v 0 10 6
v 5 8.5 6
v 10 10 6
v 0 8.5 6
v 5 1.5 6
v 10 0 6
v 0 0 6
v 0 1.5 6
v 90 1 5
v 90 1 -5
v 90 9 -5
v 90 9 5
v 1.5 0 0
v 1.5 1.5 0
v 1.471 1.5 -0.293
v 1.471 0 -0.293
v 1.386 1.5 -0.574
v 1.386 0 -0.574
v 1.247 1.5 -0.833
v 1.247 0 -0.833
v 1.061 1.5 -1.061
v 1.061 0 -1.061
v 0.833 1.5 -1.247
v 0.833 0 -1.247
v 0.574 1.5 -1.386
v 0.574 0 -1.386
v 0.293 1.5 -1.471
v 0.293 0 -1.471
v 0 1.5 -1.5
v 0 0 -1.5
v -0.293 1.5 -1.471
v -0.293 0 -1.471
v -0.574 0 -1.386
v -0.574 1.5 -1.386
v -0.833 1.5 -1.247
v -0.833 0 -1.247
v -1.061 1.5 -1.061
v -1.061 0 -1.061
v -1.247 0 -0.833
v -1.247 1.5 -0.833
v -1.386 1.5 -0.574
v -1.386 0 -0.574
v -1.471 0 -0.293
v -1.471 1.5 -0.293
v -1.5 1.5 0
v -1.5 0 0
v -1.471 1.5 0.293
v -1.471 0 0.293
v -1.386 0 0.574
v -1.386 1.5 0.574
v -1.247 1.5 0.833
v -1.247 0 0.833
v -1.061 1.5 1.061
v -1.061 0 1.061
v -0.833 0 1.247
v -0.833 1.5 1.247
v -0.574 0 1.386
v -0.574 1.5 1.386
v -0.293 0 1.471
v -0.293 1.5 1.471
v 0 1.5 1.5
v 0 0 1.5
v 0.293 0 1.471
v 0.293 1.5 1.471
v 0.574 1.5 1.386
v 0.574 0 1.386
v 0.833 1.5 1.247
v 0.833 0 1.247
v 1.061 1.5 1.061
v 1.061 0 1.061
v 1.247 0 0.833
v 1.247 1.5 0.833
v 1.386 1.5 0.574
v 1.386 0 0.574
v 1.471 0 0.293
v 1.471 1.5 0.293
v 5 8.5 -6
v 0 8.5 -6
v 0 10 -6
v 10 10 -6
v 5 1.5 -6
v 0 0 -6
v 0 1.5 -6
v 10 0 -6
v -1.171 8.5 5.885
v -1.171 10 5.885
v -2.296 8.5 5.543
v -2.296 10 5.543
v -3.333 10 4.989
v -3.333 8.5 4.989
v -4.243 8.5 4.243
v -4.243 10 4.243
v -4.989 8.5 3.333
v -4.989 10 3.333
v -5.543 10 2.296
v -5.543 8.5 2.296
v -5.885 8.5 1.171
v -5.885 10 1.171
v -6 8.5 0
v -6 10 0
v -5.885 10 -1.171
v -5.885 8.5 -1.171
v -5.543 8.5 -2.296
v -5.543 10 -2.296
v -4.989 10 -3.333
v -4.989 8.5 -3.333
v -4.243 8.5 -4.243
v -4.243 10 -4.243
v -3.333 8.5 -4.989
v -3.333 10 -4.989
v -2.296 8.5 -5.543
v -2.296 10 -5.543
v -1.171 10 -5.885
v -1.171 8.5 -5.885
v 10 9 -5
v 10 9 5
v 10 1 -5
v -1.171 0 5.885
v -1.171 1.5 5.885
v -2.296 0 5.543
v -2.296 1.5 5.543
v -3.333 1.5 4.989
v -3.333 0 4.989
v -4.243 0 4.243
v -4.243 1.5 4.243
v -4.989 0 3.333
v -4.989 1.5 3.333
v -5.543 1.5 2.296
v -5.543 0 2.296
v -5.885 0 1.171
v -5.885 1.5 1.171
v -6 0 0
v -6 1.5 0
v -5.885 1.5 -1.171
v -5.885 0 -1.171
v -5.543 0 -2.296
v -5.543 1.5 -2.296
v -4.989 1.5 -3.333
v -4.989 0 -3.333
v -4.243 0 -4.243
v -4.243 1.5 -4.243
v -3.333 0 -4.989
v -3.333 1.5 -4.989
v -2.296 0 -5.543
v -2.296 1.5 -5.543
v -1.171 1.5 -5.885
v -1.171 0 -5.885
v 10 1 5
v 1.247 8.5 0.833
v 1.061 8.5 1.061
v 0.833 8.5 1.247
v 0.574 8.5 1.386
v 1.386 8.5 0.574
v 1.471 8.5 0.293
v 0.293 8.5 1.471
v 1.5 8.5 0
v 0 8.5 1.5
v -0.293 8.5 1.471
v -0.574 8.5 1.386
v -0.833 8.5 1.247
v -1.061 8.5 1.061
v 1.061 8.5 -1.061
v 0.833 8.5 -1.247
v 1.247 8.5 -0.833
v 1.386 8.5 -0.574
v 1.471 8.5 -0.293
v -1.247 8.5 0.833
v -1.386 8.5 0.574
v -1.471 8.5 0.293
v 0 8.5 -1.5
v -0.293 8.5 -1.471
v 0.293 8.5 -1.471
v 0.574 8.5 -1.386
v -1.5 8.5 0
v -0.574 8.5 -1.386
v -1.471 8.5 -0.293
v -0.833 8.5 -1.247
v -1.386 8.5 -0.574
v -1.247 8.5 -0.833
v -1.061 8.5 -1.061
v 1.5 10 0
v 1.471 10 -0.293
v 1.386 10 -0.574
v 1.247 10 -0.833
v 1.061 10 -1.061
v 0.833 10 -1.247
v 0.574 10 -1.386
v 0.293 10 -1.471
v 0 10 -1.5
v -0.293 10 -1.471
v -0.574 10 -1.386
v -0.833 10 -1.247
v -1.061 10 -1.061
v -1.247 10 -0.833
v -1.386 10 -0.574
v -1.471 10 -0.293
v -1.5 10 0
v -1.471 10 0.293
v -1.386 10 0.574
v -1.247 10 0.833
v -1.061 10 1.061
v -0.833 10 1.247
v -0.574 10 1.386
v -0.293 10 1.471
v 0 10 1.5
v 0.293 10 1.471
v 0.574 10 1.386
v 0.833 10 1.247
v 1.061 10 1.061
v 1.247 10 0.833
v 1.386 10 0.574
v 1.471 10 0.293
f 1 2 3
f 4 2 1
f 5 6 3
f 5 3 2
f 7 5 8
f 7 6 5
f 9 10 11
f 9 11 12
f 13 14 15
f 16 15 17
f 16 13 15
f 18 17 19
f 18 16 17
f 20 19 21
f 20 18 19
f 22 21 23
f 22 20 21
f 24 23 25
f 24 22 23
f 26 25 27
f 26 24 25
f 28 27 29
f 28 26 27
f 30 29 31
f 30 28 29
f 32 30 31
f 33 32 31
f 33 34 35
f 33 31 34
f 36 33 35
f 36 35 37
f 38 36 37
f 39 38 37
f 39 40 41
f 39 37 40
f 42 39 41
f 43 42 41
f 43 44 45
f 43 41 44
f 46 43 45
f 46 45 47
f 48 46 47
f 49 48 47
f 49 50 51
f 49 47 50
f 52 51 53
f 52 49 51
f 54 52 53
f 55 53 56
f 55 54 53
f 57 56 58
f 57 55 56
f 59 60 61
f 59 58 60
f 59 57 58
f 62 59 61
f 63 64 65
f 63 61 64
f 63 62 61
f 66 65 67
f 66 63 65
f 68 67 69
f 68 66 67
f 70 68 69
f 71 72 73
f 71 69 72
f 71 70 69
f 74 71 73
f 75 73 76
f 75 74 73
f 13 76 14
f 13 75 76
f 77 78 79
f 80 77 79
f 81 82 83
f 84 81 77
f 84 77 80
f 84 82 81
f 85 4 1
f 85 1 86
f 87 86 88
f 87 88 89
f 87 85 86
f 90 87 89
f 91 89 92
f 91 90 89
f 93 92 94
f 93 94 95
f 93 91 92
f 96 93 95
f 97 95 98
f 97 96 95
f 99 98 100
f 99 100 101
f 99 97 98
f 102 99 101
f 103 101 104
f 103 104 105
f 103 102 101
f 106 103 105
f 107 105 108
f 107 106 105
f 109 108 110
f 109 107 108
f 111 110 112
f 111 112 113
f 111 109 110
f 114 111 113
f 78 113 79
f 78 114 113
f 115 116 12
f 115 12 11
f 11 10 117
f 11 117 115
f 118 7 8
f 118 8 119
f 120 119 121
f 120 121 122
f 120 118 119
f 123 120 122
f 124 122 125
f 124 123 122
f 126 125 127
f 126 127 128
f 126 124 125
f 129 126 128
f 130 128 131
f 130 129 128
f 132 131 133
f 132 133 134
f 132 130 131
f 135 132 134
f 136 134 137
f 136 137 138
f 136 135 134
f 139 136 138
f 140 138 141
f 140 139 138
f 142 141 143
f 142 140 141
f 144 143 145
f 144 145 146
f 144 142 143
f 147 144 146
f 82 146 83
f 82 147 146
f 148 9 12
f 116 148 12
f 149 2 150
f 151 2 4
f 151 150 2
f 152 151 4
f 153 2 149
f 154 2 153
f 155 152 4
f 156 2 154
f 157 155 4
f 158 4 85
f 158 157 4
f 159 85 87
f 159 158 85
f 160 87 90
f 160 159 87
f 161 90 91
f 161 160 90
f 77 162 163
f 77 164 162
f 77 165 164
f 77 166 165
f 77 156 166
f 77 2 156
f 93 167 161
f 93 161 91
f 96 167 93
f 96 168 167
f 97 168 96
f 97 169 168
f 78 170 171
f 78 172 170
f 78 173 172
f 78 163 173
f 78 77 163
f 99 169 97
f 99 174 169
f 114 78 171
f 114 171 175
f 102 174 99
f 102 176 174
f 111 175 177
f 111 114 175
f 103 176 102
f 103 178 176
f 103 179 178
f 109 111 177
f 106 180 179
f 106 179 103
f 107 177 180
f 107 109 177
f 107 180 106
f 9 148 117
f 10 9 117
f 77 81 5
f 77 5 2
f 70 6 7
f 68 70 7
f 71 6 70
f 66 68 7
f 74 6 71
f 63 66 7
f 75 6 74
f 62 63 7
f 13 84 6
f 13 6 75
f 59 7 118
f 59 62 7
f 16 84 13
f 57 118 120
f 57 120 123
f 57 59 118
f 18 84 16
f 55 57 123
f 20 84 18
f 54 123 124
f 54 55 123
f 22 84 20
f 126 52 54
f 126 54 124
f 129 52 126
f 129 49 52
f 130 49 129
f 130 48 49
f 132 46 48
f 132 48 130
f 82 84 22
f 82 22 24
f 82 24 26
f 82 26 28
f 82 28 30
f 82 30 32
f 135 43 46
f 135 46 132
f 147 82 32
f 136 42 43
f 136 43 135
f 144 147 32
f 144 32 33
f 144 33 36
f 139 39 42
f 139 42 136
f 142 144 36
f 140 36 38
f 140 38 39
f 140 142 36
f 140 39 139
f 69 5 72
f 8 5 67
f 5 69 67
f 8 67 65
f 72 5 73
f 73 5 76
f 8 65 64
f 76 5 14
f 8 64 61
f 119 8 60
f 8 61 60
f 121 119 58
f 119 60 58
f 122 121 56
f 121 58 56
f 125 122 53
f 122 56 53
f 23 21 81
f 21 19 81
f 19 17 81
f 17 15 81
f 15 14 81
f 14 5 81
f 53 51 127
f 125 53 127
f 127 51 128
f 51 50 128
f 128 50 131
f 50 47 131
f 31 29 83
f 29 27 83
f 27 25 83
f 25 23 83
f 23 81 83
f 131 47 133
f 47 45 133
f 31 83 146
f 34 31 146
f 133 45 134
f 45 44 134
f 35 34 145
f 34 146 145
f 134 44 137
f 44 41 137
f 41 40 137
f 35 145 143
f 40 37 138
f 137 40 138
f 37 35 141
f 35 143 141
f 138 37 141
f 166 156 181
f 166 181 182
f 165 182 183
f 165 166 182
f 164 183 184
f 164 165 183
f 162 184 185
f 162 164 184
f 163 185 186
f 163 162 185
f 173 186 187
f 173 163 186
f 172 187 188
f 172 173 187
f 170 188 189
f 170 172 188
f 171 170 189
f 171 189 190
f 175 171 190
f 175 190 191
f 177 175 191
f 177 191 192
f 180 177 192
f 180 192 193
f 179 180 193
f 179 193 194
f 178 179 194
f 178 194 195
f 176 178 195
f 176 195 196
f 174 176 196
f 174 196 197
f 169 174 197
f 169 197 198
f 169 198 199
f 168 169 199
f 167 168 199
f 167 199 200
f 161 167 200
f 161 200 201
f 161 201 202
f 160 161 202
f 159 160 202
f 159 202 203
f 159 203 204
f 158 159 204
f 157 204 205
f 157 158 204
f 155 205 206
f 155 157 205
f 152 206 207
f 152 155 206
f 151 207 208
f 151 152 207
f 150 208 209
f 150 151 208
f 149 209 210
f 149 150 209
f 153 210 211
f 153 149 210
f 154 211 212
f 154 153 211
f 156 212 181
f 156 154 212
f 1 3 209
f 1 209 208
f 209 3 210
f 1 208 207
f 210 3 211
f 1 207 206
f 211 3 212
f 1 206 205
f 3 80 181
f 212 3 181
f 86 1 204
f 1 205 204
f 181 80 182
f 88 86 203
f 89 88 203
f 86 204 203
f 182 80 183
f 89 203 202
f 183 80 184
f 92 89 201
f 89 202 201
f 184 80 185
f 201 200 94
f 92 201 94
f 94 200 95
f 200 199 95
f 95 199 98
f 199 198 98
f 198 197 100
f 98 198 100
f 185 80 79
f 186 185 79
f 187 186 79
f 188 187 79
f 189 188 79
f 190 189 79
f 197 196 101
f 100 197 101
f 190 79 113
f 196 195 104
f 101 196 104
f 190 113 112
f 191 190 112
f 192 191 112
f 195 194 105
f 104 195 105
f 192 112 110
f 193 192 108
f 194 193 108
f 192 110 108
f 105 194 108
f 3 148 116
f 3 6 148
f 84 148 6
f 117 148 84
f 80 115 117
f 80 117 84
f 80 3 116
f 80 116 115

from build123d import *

# Parameters (mm, degrees)
SZKIC1_R                    = 1.5
DODANIE_WYCI_GNI_CIE1_DEPTH = 10
SZKIC2_W                    = 22
SZKIC2_H                    = 7
WYTNIJ_WYCI_GNI_CIE1_DEPTH  = 13
SZKIC3_OUTSIDE_W            = 33.452
SZKIC3_OUTSIDE_H            = 31.452
SZKIC3_OUTSIDE_W_2          = 10
SZKIC3_OUTSIDE_H_2          = 8
WYTNIJ_WYCI_GNI_CIE2_DEPTH  = 80


with BuildPart() as part:
    # Szkic1 → Dodanie-wyciągnięcie1 (new body)
    with BuildSketch(Plane(origin=(0, 0, 0), x_dir=(1, 0, 0), z_dir=(0, 1, 0))):
        with BuildLine():
            Line((90, 6), (90, -6))
            Line((90, -6), (0, -6))
            ThreePointArc((0, -6), (-6, 0), (0, 6))
            Line((0, 6), (90, 6))
        make_face()
        Circle(SZKIC1_R, mode=Mode.SUBTRACT)
    extrude(amount=DODANIE_WYCI_GNI_CIE1_DEPTH)

    # Szkic2 → Wytnij-wyciągnięcie1 (cut, through all)
    with BuildSketch(Plane(origin=(0, 0, -6), x_dir=(-1, 0, 0), z_dir=(0, 0, -1))):
        with Locations((6, 5)):
            Rectangle(SZKIC2_W, SZKIC2_H)
    extrude(amount=-WYTNIJ_WYCI_GNI_CIE1_DEPTH, mode=Mode.SUBTRACT)

    # Szkic3 outside → Wytnij-wyciągnięcie2 (cut)
    with BuildSketch(Plane(origin=(90, 0, 0), x_dir=(0, 0, -1), z_dir=(1, 0, 0))):
        with Locations((0, 5)):
            Rectangle(SZKIC3_OUTSIDE_W, SZKIC3_OUTSIDE_H)
        with Locations((0, 5)):
            Rectangle(SZKIC3_OUTSIDE_W_2, SZKIC3_OUTSIDE_H_2, mode=Mode.SUBTRACT)
    extrude(amount=-WYTNIJ_WYCI_GNI_CIE2_DEPTH, mode=Mode.SUBTRACT)


solid = part.part
